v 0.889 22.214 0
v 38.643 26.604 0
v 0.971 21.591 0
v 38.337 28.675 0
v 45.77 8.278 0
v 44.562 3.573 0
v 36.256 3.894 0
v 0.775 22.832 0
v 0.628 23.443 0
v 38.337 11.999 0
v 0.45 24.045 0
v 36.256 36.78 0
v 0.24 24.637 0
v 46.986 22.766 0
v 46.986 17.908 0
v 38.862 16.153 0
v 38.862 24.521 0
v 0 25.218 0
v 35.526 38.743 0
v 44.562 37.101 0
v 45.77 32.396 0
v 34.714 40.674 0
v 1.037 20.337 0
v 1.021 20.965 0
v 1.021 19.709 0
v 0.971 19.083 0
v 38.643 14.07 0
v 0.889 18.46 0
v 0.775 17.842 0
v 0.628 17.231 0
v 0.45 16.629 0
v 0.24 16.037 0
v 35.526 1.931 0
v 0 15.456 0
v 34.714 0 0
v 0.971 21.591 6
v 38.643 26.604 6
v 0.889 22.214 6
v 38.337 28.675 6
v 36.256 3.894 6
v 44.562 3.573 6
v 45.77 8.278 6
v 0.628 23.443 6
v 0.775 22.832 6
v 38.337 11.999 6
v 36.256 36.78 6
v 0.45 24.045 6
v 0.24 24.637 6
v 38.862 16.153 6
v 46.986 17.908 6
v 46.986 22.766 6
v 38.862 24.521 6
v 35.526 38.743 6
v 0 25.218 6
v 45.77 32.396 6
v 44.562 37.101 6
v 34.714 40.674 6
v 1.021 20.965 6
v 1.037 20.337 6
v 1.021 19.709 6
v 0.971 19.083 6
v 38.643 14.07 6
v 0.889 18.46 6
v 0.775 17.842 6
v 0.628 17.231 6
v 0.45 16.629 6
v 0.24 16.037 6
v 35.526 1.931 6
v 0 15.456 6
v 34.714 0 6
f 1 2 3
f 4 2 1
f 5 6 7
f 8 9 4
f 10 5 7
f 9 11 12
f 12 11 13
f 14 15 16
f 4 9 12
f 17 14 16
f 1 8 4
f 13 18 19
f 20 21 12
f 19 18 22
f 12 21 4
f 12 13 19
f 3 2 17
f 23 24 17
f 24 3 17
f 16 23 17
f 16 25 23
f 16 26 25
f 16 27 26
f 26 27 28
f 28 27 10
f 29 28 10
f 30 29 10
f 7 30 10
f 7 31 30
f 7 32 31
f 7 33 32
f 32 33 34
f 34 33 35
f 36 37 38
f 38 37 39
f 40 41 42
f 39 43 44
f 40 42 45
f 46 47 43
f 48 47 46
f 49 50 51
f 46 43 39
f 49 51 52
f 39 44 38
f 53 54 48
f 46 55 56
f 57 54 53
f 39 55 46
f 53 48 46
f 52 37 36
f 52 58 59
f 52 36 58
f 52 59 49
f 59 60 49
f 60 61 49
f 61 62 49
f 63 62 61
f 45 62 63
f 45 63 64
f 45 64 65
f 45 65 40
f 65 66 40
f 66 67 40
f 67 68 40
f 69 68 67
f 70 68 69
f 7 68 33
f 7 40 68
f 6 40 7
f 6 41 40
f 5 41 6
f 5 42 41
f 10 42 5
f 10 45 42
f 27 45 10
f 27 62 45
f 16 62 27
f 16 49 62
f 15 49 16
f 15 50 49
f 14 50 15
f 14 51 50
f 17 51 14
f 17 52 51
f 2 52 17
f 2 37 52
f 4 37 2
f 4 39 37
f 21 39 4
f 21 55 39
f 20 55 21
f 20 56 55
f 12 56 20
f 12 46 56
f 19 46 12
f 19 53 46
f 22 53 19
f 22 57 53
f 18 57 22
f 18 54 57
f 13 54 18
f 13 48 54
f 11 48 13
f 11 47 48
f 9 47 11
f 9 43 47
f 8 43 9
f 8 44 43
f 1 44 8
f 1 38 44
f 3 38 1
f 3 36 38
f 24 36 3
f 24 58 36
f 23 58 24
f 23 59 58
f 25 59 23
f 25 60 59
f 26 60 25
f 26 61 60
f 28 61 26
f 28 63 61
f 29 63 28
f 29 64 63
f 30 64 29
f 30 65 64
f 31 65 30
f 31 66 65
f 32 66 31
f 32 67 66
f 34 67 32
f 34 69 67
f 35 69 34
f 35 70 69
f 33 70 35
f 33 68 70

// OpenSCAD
$fn = 32;

// ----------------------------------------------------------------------
// Gear sector: 3 teeth on 48 degrees
// ----------------------------------------------------------------------

// --- parameters (mm) ---
sector_angle = 48;        // sector angle, degrees
root_r = 50;              // root circle radius
tooth_h = 8;              // tooth height over the root circle
teeth = 3;                // number of teeth on the sector
hub_r = 12;               // hub bore radius
plate_t = 6;              // sector thickness, Z
arc_step = 3;             // sampling step of the root/hub arcs, degrees

tip_r = root_r + tooth_h;  // tip circle radius

profile = [[34.714, 0], [35.526, 1.931], [36.256, 3.894], [44.562, 3.573], [45.77, 8.278], [38.337, 11.999], [38.643, 14.07], [38.862, 16.153], [46.986, 17.908], [46.986, 22.766], [38.862, 24.521], [38.643, 26.604], [38.337, 28.675], [45.77, 32.396], [44.562, 37.101], [36.256, 36.78], [35.526, 38.743], [34.714, 40.674], [0, 25.218], [0.24, 24.637], [0.45, 24.045], [0.628, 23.443], [0.775, 22.832], [0.889, 22.214], [0.971, 21.591], [1.021, 20.965], [1.037, 20.337], [1.021, 19.709], [0.971, 19.083], [0.889, 18.46], [0.775, 17.842], [0.628, 17.231], [0.45, 16.629], [0.24, 16.037], [0, 15.456]];  // primary outline, 35 points, counter clockwise

// --- the one profile operation ---
linear_extrude(height = plate_t) polygon(points = profile);
